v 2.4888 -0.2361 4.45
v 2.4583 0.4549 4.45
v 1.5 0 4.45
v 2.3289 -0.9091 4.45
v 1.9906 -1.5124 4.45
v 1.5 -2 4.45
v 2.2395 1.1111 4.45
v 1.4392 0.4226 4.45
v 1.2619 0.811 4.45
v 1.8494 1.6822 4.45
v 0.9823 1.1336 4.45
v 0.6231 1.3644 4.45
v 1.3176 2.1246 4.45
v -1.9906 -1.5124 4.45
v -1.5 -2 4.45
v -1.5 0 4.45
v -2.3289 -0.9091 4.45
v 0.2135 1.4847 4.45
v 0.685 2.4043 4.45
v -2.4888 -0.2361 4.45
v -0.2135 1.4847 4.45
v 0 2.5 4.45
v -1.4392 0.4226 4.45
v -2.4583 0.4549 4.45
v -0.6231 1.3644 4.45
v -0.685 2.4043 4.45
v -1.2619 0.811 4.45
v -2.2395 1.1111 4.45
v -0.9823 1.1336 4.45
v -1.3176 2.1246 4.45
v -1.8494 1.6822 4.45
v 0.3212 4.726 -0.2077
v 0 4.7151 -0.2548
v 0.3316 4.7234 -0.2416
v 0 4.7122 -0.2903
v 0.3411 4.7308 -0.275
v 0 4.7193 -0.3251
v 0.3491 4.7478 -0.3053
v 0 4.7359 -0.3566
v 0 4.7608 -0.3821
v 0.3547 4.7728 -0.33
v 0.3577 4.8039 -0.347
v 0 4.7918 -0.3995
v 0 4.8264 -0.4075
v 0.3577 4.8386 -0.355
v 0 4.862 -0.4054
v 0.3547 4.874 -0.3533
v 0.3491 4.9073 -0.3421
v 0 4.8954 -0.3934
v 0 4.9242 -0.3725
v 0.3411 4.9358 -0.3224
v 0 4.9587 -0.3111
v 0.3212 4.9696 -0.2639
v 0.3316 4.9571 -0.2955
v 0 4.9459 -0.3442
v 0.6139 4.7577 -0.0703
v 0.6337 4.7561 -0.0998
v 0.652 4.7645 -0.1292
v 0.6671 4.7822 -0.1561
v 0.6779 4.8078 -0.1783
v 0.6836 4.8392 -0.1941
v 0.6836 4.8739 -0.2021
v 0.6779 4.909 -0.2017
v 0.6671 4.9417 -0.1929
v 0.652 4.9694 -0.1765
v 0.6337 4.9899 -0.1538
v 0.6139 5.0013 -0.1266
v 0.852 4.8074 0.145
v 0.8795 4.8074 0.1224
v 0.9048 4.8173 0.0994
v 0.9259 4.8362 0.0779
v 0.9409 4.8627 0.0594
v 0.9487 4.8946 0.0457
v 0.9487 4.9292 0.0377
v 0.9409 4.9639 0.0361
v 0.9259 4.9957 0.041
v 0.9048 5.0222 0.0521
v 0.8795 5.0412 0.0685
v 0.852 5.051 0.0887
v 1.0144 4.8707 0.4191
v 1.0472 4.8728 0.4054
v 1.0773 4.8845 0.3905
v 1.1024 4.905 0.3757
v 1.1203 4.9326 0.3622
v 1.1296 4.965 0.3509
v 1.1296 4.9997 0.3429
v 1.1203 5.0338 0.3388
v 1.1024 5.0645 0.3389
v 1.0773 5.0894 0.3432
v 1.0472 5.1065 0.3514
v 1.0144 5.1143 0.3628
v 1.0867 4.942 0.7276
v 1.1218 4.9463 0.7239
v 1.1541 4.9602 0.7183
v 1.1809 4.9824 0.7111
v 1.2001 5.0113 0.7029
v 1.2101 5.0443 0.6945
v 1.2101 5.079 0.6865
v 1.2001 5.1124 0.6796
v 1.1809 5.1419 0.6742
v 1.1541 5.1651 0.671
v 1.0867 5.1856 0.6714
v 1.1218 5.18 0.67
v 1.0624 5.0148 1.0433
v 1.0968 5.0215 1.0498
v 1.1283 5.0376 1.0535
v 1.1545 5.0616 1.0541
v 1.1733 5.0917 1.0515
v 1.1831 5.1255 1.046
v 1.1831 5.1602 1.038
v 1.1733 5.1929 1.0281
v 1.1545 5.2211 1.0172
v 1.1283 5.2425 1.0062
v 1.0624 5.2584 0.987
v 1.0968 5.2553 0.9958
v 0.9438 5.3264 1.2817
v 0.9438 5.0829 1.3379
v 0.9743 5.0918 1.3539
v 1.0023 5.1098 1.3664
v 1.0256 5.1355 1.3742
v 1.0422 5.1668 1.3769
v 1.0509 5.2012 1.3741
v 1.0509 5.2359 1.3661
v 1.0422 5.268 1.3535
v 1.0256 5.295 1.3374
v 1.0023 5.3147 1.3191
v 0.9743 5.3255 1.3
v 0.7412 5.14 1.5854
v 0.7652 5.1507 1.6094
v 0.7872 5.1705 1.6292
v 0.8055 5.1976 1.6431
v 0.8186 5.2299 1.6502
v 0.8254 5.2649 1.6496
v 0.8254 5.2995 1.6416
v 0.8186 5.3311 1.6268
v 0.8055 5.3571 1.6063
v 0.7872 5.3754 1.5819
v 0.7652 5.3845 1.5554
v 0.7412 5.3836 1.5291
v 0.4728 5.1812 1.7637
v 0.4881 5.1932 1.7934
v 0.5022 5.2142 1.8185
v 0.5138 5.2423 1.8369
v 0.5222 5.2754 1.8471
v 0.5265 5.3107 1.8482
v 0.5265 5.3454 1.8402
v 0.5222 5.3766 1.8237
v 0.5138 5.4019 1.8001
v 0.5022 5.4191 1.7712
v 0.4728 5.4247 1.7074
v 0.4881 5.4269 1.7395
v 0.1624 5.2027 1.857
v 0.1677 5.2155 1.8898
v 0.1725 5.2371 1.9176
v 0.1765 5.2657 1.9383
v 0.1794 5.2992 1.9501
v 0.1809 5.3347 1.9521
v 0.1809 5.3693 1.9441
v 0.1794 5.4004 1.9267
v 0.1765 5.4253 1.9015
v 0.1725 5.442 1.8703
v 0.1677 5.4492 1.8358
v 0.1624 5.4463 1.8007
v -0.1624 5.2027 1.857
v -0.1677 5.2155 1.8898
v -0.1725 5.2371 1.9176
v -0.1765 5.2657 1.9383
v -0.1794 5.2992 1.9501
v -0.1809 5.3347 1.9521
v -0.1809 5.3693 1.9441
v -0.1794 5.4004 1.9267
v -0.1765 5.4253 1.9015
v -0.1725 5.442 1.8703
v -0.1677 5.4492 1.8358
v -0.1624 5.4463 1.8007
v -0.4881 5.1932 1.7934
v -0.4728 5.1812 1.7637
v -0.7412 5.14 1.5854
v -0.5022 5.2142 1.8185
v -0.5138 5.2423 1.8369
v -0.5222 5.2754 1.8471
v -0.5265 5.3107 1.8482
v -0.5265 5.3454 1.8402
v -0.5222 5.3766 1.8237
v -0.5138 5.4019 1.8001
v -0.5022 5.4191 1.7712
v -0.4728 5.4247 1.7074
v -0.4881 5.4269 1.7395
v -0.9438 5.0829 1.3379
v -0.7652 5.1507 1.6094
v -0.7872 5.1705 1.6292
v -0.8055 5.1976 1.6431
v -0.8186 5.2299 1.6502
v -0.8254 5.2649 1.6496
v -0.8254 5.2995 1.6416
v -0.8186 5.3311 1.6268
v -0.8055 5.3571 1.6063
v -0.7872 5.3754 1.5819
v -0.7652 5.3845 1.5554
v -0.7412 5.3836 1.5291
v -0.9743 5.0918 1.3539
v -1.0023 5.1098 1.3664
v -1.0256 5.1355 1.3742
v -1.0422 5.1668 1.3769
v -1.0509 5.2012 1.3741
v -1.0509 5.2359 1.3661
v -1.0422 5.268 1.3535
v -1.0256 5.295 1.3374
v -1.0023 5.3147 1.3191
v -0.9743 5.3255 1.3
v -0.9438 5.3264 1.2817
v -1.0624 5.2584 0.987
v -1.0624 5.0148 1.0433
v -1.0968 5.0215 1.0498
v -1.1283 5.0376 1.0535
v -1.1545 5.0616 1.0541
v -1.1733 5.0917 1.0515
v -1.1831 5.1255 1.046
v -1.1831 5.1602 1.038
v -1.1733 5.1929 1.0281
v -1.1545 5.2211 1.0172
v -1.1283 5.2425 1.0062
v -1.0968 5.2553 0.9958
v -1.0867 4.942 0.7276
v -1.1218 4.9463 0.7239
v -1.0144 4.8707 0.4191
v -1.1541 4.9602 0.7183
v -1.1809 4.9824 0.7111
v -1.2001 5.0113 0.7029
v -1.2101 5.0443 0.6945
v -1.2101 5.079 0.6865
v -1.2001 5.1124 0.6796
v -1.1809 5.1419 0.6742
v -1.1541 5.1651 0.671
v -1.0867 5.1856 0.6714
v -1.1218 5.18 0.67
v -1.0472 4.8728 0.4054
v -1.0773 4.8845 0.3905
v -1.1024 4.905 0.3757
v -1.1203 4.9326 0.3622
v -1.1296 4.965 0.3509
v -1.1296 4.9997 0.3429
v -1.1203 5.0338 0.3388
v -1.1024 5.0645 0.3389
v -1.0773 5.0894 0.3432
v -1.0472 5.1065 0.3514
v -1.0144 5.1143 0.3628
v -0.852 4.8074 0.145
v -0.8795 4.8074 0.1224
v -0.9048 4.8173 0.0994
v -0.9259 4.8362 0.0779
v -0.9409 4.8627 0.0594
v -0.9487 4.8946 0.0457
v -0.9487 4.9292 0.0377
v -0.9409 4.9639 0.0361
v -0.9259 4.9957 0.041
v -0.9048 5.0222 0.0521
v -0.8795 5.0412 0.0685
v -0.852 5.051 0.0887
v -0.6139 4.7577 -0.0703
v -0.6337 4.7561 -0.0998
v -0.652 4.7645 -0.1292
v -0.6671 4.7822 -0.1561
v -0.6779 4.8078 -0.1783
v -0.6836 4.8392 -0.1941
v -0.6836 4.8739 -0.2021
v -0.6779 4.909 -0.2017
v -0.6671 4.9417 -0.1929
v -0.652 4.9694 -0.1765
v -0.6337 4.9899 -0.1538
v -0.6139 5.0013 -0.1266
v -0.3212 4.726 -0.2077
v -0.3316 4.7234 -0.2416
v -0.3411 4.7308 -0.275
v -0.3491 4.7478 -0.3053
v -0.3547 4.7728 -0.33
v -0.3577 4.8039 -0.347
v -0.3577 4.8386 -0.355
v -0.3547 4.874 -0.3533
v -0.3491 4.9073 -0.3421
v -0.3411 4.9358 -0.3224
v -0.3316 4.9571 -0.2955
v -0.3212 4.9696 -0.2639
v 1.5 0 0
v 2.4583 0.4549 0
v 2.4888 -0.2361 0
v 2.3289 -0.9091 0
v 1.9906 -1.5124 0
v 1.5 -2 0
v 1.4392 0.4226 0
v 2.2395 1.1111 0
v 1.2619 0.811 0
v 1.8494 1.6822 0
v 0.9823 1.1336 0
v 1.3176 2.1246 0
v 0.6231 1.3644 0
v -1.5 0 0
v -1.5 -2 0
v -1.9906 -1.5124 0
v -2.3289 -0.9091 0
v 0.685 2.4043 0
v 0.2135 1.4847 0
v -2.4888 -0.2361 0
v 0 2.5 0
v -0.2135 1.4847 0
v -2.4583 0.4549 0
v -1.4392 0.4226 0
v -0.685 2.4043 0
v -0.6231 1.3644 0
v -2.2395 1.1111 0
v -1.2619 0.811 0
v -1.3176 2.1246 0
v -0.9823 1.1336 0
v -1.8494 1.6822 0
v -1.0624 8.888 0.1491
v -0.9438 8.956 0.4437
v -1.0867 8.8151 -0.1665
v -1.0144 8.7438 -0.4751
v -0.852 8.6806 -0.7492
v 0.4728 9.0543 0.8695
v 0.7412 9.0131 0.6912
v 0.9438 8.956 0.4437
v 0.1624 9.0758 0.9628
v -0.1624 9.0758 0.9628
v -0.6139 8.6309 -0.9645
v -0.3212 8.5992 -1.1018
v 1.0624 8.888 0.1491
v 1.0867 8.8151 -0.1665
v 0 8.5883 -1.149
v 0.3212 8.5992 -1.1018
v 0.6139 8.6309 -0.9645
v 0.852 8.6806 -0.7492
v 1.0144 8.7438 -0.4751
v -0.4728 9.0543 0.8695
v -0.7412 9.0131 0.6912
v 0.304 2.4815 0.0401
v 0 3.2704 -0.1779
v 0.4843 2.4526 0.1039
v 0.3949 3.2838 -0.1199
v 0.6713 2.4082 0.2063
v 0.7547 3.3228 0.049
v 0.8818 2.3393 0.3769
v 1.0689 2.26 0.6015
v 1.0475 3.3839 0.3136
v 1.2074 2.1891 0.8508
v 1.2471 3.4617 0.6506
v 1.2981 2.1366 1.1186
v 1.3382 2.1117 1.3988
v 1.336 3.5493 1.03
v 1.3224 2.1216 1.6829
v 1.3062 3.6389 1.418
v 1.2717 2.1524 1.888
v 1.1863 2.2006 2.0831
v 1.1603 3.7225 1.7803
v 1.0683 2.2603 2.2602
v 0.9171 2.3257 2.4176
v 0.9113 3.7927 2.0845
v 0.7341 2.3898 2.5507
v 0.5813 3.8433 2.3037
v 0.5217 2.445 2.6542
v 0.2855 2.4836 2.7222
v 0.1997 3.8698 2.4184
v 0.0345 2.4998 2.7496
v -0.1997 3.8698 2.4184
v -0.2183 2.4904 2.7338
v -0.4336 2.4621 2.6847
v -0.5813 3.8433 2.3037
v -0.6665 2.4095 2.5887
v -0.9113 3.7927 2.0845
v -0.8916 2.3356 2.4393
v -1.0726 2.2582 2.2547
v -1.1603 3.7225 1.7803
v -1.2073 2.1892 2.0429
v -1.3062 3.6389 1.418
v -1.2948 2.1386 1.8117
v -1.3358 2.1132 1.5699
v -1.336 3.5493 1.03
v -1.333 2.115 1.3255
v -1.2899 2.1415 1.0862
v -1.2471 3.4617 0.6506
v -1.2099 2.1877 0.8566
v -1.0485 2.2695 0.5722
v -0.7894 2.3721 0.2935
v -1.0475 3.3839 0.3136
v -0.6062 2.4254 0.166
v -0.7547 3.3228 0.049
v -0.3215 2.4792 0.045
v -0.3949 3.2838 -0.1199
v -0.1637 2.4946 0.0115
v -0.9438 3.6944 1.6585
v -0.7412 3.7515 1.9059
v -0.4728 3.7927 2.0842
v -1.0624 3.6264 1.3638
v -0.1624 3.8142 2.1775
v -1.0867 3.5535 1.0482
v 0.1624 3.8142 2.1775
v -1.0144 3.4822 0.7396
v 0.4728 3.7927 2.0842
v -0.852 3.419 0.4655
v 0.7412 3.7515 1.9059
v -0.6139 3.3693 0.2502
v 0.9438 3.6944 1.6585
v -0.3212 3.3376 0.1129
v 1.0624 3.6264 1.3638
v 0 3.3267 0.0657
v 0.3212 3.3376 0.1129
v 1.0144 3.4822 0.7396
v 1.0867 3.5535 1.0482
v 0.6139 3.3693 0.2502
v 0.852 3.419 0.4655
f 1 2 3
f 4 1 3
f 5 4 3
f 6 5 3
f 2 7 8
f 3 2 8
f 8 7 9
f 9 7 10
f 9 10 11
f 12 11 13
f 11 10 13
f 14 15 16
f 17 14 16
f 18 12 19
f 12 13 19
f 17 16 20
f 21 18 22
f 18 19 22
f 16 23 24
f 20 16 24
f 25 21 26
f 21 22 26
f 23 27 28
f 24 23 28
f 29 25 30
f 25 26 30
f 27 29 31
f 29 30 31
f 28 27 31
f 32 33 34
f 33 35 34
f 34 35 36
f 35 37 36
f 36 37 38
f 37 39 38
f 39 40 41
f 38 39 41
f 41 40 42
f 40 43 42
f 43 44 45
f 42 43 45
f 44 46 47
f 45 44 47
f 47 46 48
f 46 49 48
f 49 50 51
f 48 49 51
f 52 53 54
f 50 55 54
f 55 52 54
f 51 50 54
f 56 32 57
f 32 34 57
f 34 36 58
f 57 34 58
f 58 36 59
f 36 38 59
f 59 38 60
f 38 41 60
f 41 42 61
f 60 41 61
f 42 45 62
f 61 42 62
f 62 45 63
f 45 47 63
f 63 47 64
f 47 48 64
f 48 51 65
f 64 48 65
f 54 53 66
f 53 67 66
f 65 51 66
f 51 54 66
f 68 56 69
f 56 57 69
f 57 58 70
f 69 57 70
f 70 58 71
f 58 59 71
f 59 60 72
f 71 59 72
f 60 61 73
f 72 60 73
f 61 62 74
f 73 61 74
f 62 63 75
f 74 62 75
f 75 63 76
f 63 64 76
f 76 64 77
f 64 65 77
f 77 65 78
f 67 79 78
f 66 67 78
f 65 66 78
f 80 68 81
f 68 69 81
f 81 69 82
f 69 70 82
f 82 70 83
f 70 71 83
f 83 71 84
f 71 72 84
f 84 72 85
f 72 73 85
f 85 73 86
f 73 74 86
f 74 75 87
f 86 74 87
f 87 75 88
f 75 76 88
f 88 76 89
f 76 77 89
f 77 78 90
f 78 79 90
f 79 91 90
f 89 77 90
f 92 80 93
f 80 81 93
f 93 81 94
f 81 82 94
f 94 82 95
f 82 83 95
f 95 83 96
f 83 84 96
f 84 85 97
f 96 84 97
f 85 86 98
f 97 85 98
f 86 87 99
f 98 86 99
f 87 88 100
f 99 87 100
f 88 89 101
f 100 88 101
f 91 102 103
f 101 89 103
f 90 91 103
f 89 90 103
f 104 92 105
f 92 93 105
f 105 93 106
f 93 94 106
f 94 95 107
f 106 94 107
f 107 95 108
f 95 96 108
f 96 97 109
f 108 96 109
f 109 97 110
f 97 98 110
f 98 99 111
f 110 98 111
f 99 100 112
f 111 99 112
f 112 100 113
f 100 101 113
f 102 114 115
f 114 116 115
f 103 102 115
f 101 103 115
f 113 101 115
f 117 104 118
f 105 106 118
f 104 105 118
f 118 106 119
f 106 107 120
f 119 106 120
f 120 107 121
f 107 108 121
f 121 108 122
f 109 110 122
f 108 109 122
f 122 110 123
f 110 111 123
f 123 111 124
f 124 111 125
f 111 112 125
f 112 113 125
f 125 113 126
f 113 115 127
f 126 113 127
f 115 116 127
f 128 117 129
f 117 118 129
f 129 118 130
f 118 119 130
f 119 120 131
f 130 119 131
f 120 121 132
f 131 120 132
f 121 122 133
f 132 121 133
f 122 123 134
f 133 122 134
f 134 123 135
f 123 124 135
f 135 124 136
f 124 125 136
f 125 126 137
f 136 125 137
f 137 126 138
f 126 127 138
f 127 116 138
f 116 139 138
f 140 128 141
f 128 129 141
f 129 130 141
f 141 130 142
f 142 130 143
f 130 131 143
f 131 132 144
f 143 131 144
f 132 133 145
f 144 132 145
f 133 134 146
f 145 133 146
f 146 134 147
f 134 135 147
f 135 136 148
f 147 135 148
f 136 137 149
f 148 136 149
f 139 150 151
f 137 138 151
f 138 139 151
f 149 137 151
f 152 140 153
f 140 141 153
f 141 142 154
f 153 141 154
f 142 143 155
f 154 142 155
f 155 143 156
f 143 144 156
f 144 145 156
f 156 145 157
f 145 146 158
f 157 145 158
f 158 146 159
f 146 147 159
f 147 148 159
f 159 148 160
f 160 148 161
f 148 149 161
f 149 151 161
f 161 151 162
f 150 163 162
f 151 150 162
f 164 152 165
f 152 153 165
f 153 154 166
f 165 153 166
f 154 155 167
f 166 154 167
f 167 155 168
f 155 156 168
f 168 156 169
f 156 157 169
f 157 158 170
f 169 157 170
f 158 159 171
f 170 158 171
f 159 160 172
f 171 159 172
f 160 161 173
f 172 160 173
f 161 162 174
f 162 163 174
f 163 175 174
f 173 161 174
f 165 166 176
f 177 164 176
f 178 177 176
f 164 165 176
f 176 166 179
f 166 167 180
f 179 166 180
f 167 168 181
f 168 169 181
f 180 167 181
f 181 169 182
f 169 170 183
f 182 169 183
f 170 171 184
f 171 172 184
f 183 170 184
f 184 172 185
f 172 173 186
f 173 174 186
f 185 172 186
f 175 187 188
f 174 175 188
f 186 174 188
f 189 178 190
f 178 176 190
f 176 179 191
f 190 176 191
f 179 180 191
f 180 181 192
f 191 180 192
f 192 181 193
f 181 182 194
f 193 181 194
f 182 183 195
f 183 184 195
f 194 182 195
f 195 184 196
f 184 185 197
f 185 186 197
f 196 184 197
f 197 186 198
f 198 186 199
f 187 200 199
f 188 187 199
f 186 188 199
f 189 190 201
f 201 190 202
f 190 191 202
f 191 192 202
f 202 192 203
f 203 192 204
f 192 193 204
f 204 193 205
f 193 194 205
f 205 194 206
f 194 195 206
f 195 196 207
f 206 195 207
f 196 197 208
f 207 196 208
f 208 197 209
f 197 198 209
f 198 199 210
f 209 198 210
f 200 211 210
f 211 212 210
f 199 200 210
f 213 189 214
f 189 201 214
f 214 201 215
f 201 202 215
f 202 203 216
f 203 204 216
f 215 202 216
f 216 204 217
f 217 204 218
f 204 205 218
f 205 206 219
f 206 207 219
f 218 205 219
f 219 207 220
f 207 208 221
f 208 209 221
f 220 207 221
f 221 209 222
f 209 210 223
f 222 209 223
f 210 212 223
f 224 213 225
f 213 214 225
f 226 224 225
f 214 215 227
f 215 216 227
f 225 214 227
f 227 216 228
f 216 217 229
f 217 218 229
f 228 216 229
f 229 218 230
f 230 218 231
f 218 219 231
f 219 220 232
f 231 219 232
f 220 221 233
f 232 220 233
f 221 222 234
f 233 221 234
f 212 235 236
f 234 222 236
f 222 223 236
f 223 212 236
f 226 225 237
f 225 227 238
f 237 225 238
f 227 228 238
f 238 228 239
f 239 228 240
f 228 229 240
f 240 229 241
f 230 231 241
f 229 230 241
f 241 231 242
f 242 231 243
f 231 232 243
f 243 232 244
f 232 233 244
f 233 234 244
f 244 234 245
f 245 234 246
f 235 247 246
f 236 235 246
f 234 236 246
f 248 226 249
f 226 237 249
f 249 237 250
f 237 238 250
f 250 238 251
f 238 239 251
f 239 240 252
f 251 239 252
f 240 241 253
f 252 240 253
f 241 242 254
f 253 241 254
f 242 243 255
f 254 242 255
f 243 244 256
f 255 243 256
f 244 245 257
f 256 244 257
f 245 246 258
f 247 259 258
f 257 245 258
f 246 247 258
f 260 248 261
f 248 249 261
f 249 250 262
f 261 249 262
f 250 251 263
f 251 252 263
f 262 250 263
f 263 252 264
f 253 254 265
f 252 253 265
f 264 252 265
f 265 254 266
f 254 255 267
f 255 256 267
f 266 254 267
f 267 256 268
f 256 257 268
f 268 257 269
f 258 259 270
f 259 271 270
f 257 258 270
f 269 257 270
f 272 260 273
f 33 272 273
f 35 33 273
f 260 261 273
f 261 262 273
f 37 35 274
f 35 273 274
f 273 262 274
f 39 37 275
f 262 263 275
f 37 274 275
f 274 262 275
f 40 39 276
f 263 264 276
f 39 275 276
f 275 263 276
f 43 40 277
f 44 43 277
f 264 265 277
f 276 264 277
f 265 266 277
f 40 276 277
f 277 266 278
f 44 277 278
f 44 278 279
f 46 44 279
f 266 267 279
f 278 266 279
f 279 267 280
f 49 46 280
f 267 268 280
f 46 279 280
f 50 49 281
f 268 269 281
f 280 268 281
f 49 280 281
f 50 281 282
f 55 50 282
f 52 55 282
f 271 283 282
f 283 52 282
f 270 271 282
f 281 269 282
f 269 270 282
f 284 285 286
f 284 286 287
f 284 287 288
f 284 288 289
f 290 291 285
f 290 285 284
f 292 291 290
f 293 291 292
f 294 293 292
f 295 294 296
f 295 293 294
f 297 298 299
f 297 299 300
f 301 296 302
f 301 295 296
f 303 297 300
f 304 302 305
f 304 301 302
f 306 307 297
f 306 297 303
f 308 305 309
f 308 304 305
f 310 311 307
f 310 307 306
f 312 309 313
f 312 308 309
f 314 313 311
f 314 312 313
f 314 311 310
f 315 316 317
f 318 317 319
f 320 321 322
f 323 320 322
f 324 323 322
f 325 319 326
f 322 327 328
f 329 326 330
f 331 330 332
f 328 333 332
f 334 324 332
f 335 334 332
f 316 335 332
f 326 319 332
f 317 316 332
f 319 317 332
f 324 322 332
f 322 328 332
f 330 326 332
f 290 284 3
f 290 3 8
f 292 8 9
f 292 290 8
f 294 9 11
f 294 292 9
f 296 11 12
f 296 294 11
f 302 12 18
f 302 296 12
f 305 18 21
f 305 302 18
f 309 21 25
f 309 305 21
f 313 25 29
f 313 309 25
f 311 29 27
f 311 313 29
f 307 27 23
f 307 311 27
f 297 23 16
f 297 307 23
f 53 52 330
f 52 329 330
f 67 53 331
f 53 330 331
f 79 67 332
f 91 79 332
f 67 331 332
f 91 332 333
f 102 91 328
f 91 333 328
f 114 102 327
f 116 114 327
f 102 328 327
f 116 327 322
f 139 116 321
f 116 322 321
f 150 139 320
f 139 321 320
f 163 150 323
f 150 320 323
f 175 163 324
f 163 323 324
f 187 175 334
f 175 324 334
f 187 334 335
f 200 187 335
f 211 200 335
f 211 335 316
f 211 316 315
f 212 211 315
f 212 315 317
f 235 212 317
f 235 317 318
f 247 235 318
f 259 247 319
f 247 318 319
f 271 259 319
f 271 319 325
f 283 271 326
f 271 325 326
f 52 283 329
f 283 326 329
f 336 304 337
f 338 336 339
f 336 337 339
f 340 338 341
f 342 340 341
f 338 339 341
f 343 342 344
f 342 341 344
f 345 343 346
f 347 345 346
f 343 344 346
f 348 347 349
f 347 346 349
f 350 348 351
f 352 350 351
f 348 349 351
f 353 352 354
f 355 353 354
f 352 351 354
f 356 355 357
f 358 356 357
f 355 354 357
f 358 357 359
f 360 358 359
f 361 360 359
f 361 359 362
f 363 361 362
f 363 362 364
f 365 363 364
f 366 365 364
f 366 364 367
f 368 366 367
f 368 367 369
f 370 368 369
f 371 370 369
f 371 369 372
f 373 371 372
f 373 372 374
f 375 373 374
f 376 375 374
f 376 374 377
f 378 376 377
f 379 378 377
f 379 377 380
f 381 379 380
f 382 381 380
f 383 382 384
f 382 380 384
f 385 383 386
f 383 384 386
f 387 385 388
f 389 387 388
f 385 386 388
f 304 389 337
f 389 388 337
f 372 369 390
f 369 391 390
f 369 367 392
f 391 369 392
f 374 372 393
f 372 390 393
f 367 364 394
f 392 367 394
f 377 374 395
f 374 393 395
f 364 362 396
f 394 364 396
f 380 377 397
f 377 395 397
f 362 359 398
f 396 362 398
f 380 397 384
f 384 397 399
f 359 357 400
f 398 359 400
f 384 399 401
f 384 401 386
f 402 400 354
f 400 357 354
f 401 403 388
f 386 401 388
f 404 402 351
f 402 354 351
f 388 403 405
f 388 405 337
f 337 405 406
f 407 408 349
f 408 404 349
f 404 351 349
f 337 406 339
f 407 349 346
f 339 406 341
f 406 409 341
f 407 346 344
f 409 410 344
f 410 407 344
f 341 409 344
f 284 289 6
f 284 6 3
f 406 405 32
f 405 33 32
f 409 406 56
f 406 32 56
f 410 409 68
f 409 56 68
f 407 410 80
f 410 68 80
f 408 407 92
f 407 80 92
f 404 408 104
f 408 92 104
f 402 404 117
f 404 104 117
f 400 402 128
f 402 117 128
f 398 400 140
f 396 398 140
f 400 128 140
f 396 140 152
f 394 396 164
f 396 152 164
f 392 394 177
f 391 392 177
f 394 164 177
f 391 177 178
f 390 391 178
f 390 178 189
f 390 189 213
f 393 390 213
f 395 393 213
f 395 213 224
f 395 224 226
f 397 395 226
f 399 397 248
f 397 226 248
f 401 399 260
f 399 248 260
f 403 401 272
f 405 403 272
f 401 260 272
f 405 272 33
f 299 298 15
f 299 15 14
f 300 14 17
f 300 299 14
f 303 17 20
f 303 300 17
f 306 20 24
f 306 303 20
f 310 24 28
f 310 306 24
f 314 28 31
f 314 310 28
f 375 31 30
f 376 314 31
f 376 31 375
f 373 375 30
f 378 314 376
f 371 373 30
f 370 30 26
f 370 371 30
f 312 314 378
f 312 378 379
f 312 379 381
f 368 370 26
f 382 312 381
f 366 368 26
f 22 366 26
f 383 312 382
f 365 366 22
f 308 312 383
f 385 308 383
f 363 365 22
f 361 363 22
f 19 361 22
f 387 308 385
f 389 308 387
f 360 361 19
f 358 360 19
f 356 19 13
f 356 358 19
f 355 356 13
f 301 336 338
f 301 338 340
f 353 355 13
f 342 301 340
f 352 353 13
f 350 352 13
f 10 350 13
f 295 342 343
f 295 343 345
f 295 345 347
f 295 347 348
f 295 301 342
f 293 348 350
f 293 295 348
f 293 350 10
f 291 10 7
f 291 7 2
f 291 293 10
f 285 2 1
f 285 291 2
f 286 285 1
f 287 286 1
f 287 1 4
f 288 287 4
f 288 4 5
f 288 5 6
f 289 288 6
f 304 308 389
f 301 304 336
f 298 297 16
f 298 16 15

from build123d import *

# Parameters (mm, degrees)
BOSS_EXTRUDE1_DEPTH = 4.45


with BuildPart() as part:
    # Sketch1 → Boss-Extrude1 (new body)
    with BuildSketch(Plane.XY):
        with BuildLine():
            Line((-1.5, 0), (-1.5, -2))
            ThreePointArc((-1.5, -2), (0, 2.5), (1.5, -2))
            Line((1.5, -2), (1.5, 0))
            ThreePointArc((1.5, 0), (0, 1.5), (-1.5, 0))
        make_face()
    extrude(amount=BOSS_EXTRUDE1_DEPTH)

    # Sketch3 → Revolve3 (revolve)
    with BuildSketch(Plane(origin=(0, 0, 0), x_dir=(0, 0, -1), z_dir=(1, 0, 0))):
        with BuildLine():
            Line((0, 2.5), (0.177867067, 3.270426908))
            Line((0.177867067, 3.270426908), (-0.06572545, 3.326664671))
            Line((-0.06572545, 3.326664671), (0.254829803, 4.715142014))
            ThreePointArc((0.254829803, 4.715142014), (0.404744943, 4.80881939), (0.311067566, 4.95873453))
            Line((0.311067566, 4.95873453), (1.149010244, 8.588263021))
            Line((1.149010244, 8.588263021), (0.087181853, 8.833405421))
            Line((0.087181853, 8.833405421), (-1.496634638, 1.973142501))
            Line((-1.496634638, 1.973142501), (-0.191213731, 1.671762337))
            Line((-0.191213731, 1.671762337), (0, 2.5))
        make_face()
    revolve(axis=Axis((0, 8.833405421, -0.087181853), (0, -0.974370065, 0.224951054)))


solid = part.part
